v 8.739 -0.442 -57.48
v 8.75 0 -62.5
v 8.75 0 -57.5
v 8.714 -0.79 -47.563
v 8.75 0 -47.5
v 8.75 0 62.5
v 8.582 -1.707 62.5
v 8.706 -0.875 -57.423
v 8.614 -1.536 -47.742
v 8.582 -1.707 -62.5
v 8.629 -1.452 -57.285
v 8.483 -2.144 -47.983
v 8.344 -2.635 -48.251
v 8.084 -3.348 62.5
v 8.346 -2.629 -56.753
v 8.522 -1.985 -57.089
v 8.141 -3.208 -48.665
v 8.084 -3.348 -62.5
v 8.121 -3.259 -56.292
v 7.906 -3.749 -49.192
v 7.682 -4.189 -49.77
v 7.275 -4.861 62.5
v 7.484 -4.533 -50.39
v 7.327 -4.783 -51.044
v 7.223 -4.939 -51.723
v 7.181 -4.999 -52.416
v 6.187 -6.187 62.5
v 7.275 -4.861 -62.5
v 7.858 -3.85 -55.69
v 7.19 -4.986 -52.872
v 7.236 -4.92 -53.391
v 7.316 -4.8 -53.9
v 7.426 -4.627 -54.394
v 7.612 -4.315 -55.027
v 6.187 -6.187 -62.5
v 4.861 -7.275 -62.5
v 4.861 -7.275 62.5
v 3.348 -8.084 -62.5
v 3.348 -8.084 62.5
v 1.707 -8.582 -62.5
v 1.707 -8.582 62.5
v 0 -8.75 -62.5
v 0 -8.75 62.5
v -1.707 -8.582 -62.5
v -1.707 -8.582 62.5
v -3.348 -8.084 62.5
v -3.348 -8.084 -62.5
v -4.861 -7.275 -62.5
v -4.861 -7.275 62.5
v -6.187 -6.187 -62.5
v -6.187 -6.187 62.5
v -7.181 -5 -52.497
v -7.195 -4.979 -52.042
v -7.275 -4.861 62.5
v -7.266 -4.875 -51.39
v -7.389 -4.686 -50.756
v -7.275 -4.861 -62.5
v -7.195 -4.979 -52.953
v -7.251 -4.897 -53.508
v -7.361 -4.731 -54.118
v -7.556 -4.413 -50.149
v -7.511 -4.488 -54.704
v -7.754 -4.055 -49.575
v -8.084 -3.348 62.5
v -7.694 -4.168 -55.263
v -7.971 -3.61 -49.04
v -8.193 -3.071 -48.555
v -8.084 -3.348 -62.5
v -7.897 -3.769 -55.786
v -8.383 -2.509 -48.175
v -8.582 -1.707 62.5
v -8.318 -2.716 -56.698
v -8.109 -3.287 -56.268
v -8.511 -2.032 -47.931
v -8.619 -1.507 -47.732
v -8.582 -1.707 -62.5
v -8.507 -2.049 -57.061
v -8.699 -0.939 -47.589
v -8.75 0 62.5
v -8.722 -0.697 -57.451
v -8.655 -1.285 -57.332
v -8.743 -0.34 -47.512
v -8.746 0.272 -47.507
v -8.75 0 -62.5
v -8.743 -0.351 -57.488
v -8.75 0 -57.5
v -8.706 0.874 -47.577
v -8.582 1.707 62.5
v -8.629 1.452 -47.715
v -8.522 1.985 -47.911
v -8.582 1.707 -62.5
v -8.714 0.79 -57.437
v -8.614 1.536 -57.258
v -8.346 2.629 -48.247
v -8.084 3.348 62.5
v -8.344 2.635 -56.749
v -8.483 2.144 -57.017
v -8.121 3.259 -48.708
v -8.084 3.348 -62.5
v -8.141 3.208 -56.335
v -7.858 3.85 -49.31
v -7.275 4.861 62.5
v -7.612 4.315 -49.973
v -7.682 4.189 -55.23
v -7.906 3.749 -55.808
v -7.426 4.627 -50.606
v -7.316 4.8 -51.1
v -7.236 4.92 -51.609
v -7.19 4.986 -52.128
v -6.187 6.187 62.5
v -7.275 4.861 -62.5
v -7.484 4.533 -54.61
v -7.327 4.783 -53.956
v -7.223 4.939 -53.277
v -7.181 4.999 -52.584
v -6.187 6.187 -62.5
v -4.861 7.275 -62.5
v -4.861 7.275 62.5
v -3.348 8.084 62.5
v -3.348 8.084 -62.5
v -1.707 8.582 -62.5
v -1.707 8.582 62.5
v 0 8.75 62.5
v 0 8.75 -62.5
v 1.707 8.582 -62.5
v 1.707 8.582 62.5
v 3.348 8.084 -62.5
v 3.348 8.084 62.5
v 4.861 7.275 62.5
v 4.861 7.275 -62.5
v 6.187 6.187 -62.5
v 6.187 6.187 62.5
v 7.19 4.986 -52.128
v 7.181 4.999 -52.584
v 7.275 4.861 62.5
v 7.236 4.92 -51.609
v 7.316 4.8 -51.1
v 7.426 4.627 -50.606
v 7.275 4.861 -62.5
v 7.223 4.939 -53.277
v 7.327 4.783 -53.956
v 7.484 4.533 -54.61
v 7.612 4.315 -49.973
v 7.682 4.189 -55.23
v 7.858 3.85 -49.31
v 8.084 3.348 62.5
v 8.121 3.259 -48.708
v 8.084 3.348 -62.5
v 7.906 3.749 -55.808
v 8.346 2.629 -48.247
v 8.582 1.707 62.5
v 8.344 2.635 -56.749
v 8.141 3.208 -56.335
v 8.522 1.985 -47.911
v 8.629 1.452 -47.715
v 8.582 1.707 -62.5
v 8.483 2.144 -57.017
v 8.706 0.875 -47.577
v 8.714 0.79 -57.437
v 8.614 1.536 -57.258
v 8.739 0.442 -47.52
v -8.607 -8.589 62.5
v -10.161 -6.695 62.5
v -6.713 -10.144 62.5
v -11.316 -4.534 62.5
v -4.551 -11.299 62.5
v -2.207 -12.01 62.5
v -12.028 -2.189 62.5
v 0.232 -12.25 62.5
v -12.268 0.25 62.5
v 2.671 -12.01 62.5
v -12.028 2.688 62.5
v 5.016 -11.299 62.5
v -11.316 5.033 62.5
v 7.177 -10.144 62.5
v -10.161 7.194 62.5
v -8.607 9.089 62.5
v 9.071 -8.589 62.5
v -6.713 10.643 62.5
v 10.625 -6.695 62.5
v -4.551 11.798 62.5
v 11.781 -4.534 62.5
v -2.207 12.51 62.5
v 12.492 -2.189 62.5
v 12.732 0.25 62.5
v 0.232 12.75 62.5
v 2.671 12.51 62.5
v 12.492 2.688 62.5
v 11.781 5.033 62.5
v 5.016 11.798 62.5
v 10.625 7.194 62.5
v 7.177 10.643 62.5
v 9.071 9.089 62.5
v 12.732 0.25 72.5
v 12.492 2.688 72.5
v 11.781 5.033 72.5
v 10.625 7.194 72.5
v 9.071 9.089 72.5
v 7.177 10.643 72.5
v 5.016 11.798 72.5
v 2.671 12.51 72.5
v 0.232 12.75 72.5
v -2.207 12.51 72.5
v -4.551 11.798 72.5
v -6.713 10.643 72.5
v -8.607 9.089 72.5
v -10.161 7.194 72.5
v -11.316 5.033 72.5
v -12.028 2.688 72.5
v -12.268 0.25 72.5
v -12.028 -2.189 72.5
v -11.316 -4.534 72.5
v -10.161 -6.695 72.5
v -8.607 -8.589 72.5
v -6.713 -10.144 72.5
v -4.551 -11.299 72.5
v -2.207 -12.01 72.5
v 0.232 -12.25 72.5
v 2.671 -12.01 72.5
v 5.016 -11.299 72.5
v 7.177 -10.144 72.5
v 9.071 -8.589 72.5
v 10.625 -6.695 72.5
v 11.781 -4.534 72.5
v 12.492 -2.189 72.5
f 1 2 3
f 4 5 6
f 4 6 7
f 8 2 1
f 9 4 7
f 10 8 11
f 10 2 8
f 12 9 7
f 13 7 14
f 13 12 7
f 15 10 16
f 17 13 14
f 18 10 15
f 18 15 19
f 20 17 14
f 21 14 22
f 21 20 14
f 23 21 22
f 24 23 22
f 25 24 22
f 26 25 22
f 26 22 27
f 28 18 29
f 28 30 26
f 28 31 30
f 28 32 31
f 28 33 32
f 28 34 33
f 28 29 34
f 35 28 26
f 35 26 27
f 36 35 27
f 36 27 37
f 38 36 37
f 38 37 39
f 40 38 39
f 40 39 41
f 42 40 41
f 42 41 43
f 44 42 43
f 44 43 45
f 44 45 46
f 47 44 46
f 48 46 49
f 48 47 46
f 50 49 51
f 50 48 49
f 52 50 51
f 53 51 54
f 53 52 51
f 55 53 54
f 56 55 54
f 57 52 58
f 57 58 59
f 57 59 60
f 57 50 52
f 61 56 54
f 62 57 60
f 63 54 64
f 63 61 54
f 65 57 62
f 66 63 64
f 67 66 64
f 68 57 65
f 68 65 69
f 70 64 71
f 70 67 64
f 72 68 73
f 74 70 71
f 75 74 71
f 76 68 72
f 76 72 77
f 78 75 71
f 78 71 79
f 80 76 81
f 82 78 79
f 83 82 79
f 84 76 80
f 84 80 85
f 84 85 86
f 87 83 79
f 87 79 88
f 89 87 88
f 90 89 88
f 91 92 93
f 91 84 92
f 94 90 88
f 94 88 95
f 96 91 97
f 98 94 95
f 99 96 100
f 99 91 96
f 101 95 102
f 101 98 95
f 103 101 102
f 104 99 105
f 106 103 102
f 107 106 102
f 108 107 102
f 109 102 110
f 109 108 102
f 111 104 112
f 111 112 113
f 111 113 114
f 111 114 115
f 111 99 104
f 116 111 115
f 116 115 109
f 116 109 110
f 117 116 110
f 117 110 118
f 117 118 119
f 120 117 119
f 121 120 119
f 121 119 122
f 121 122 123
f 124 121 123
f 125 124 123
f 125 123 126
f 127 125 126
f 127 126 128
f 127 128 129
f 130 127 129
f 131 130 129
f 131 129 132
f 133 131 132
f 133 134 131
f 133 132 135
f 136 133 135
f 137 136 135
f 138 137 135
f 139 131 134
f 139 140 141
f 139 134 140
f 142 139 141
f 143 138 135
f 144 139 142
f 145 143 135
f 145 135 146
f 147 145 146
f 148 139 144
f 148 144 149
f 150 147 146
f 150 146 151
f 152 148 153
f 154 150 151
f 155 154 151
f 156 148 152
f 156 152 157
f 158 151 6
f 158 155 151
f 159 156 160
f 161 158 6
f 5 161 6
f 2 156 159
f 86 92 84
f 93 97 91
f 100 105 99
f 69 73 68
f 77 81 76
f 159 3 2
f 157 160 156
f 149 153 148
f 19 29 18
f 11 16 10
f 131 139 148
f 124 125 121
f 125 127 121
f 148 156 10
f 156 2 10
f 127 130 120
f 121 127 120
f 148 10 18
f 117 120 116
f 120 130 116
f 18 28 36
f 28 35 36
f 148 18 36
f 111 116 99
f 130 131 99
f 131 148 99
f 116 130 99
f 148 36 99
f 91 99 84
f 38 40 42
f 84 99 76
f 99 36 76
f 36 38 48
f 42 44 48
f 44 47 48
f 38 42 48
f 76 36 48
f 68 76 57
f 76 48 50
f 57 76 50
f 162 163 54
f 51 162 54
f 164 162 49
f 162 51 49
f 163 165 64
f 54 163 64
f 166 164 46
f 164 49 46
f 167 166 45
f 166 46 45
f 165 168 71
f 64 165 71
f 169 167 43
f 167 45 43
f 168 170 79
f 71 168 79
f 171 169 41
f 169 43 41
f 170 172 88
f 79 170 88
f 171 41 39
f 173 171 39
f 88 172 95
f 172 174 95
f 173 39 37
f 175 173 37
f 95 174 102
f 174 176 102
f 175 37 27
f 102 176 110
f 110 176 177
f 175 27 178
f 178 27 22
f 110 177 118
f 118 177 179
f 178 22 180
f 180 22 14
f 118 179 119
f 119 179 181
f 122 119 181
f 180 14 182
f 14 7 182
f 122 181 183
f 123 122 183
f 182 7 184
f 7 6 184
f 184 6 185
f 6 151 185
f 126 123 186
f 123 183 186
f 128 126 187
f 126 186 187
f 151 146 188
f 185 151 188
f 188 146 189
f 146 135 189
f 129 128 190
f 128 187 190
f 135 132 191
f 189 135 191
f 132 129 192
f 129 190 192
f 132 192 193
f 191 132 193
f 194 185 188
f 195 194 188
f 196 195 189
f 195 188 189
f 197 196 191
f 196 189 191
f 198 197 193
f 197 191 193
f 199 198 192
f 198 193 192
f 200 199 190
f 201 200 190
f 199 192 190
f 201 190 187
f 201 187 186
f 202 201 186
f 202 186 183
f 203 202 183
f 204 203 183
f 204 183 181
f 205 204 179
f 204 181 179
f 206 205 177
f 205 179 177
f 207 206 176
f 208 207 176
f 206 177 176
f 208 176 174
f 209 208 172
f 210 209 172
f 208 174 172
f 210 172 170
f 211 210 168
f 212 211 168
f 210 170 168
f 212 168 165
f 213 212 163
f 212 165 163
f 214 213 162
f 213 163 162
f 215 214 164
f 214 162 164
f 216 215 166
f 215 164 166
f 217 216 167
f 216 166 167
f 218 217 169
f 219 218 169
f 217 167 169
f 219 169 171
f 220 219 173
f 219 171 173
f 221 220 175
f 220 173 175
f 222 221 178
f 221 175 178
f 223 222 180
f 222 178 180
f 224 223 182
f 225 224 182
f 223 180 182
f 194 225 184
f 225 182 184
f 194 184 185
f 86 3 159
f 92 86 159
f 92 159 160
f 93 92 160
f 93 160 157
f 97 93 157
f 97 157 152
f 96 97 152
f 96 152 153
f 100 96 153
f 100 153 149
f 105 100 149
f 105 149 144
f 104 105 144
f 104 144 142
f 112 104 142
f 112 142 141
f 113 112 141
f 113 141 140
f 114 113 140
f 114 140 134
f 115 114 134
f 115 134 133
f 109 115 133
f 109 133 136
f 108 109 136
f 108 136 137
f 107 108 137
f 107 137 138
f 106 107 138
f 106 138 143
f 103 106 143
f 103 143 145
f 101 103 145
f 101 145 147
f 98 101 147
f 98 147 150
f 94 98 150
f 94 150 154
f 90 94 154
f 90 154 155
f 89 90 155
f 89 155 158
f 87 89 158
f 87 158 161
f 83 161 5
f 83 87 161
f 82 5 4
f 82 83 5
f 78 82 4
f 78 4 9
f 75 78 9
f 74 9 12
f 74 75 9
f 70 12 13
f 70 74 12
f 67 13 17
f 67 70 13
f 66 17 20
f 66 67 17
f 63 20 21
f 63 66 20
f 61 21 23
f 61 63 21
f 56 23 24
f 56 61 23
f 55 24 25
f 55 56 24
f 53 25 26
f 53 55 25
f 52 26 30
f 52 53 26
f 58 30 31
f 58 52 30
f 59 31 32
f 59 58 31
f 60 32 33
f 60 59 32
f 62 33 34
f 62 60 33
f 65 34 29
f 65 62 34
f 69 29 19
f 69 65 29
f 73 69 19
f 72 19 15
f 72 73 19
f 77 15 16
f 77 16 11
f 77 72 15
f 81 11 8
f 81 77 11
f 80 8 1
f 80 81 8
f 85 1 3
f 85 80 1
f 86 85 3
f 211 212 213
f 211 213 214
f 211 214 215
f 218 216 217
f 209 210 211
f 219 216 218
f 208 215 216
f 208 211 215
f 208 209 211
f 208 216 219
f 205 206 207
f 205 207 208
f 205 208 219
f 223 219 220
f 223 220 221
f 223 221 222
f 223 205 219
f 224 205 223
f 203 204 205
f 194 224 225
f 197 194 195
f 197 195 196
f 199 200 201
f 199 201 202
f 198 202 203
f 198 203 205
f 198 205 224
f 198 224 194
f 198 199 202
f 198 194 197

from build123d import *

# Parameters (mm, degrees)
SKETCH1_W               = 125
SKETCH1_H               = 8.75
BOSS_EXTRUDE1_START     = 62.5
BOSS_EXTRUDE1_OUTLINE_R = 12.5
BOSS_EXTRUDE1_DEPTH     = 10
CUT_EXTRUDE1_DEPTH      = 75.705524807
CUT_EXTRUDE1_DEPTH_BACK = 75.705524807
SKETCH2_R               = 5


# Read off the part's stored shape, not the designer's step: Boss-Extrude1
with BuildPart() as part:
    # Sketch1 → Revolve1 (revolve)
    with BuildSketch(Plane(origin=(0, 0, 0), x_dir=(0, 0, -1), z_dir=(1, 0, 0)), mode=Mode.PRIVATE) as revolve1_sk:
        with Locations((0, 4.375)):
            Rectangle(SKETCH1_W, SKETCH1_H)
    revolve(revolve1_sk.sketch.rotate(Axis((0, 0, 0), (0, 0, -1)), 90), axis=Axis((0, 0, 0), (0, 0, -1)))

    # Boss-Extrude1 outline → Boss-Extrude1 (add)
    with BuildSketch(Plane.XY.offset(BOSS_EXTRUDE1_START)):
        with Locations((0.232114028, 0.249851338)):
            Circle(BOSS_EXTRUDE1_OUTLINE_R)
    extrude(amount=BOSS_EXTRUDE1_DEPTH)

    # Sketch2 → Cut-Extrude1 (cut, two sides: drawn at the far end of the back side and taken through both)
    with BuildSketch(Plane(origin=(0, 0, 0), x_dir=(0, 0, -1), z_dir=(1, 0, 0)).offset(-CUT_EXTRUDE1_DEPTH_BACK)):
        with Locations((52.5, 0)):
            Circle(SKETCH2_R)
    extrude(amount=CUT_EXTRUDE1_DEPTH + CUT_EXTRUDE1_DEPTH_BACK, mode=Mode.SUBTRACT)


solid = part.part
